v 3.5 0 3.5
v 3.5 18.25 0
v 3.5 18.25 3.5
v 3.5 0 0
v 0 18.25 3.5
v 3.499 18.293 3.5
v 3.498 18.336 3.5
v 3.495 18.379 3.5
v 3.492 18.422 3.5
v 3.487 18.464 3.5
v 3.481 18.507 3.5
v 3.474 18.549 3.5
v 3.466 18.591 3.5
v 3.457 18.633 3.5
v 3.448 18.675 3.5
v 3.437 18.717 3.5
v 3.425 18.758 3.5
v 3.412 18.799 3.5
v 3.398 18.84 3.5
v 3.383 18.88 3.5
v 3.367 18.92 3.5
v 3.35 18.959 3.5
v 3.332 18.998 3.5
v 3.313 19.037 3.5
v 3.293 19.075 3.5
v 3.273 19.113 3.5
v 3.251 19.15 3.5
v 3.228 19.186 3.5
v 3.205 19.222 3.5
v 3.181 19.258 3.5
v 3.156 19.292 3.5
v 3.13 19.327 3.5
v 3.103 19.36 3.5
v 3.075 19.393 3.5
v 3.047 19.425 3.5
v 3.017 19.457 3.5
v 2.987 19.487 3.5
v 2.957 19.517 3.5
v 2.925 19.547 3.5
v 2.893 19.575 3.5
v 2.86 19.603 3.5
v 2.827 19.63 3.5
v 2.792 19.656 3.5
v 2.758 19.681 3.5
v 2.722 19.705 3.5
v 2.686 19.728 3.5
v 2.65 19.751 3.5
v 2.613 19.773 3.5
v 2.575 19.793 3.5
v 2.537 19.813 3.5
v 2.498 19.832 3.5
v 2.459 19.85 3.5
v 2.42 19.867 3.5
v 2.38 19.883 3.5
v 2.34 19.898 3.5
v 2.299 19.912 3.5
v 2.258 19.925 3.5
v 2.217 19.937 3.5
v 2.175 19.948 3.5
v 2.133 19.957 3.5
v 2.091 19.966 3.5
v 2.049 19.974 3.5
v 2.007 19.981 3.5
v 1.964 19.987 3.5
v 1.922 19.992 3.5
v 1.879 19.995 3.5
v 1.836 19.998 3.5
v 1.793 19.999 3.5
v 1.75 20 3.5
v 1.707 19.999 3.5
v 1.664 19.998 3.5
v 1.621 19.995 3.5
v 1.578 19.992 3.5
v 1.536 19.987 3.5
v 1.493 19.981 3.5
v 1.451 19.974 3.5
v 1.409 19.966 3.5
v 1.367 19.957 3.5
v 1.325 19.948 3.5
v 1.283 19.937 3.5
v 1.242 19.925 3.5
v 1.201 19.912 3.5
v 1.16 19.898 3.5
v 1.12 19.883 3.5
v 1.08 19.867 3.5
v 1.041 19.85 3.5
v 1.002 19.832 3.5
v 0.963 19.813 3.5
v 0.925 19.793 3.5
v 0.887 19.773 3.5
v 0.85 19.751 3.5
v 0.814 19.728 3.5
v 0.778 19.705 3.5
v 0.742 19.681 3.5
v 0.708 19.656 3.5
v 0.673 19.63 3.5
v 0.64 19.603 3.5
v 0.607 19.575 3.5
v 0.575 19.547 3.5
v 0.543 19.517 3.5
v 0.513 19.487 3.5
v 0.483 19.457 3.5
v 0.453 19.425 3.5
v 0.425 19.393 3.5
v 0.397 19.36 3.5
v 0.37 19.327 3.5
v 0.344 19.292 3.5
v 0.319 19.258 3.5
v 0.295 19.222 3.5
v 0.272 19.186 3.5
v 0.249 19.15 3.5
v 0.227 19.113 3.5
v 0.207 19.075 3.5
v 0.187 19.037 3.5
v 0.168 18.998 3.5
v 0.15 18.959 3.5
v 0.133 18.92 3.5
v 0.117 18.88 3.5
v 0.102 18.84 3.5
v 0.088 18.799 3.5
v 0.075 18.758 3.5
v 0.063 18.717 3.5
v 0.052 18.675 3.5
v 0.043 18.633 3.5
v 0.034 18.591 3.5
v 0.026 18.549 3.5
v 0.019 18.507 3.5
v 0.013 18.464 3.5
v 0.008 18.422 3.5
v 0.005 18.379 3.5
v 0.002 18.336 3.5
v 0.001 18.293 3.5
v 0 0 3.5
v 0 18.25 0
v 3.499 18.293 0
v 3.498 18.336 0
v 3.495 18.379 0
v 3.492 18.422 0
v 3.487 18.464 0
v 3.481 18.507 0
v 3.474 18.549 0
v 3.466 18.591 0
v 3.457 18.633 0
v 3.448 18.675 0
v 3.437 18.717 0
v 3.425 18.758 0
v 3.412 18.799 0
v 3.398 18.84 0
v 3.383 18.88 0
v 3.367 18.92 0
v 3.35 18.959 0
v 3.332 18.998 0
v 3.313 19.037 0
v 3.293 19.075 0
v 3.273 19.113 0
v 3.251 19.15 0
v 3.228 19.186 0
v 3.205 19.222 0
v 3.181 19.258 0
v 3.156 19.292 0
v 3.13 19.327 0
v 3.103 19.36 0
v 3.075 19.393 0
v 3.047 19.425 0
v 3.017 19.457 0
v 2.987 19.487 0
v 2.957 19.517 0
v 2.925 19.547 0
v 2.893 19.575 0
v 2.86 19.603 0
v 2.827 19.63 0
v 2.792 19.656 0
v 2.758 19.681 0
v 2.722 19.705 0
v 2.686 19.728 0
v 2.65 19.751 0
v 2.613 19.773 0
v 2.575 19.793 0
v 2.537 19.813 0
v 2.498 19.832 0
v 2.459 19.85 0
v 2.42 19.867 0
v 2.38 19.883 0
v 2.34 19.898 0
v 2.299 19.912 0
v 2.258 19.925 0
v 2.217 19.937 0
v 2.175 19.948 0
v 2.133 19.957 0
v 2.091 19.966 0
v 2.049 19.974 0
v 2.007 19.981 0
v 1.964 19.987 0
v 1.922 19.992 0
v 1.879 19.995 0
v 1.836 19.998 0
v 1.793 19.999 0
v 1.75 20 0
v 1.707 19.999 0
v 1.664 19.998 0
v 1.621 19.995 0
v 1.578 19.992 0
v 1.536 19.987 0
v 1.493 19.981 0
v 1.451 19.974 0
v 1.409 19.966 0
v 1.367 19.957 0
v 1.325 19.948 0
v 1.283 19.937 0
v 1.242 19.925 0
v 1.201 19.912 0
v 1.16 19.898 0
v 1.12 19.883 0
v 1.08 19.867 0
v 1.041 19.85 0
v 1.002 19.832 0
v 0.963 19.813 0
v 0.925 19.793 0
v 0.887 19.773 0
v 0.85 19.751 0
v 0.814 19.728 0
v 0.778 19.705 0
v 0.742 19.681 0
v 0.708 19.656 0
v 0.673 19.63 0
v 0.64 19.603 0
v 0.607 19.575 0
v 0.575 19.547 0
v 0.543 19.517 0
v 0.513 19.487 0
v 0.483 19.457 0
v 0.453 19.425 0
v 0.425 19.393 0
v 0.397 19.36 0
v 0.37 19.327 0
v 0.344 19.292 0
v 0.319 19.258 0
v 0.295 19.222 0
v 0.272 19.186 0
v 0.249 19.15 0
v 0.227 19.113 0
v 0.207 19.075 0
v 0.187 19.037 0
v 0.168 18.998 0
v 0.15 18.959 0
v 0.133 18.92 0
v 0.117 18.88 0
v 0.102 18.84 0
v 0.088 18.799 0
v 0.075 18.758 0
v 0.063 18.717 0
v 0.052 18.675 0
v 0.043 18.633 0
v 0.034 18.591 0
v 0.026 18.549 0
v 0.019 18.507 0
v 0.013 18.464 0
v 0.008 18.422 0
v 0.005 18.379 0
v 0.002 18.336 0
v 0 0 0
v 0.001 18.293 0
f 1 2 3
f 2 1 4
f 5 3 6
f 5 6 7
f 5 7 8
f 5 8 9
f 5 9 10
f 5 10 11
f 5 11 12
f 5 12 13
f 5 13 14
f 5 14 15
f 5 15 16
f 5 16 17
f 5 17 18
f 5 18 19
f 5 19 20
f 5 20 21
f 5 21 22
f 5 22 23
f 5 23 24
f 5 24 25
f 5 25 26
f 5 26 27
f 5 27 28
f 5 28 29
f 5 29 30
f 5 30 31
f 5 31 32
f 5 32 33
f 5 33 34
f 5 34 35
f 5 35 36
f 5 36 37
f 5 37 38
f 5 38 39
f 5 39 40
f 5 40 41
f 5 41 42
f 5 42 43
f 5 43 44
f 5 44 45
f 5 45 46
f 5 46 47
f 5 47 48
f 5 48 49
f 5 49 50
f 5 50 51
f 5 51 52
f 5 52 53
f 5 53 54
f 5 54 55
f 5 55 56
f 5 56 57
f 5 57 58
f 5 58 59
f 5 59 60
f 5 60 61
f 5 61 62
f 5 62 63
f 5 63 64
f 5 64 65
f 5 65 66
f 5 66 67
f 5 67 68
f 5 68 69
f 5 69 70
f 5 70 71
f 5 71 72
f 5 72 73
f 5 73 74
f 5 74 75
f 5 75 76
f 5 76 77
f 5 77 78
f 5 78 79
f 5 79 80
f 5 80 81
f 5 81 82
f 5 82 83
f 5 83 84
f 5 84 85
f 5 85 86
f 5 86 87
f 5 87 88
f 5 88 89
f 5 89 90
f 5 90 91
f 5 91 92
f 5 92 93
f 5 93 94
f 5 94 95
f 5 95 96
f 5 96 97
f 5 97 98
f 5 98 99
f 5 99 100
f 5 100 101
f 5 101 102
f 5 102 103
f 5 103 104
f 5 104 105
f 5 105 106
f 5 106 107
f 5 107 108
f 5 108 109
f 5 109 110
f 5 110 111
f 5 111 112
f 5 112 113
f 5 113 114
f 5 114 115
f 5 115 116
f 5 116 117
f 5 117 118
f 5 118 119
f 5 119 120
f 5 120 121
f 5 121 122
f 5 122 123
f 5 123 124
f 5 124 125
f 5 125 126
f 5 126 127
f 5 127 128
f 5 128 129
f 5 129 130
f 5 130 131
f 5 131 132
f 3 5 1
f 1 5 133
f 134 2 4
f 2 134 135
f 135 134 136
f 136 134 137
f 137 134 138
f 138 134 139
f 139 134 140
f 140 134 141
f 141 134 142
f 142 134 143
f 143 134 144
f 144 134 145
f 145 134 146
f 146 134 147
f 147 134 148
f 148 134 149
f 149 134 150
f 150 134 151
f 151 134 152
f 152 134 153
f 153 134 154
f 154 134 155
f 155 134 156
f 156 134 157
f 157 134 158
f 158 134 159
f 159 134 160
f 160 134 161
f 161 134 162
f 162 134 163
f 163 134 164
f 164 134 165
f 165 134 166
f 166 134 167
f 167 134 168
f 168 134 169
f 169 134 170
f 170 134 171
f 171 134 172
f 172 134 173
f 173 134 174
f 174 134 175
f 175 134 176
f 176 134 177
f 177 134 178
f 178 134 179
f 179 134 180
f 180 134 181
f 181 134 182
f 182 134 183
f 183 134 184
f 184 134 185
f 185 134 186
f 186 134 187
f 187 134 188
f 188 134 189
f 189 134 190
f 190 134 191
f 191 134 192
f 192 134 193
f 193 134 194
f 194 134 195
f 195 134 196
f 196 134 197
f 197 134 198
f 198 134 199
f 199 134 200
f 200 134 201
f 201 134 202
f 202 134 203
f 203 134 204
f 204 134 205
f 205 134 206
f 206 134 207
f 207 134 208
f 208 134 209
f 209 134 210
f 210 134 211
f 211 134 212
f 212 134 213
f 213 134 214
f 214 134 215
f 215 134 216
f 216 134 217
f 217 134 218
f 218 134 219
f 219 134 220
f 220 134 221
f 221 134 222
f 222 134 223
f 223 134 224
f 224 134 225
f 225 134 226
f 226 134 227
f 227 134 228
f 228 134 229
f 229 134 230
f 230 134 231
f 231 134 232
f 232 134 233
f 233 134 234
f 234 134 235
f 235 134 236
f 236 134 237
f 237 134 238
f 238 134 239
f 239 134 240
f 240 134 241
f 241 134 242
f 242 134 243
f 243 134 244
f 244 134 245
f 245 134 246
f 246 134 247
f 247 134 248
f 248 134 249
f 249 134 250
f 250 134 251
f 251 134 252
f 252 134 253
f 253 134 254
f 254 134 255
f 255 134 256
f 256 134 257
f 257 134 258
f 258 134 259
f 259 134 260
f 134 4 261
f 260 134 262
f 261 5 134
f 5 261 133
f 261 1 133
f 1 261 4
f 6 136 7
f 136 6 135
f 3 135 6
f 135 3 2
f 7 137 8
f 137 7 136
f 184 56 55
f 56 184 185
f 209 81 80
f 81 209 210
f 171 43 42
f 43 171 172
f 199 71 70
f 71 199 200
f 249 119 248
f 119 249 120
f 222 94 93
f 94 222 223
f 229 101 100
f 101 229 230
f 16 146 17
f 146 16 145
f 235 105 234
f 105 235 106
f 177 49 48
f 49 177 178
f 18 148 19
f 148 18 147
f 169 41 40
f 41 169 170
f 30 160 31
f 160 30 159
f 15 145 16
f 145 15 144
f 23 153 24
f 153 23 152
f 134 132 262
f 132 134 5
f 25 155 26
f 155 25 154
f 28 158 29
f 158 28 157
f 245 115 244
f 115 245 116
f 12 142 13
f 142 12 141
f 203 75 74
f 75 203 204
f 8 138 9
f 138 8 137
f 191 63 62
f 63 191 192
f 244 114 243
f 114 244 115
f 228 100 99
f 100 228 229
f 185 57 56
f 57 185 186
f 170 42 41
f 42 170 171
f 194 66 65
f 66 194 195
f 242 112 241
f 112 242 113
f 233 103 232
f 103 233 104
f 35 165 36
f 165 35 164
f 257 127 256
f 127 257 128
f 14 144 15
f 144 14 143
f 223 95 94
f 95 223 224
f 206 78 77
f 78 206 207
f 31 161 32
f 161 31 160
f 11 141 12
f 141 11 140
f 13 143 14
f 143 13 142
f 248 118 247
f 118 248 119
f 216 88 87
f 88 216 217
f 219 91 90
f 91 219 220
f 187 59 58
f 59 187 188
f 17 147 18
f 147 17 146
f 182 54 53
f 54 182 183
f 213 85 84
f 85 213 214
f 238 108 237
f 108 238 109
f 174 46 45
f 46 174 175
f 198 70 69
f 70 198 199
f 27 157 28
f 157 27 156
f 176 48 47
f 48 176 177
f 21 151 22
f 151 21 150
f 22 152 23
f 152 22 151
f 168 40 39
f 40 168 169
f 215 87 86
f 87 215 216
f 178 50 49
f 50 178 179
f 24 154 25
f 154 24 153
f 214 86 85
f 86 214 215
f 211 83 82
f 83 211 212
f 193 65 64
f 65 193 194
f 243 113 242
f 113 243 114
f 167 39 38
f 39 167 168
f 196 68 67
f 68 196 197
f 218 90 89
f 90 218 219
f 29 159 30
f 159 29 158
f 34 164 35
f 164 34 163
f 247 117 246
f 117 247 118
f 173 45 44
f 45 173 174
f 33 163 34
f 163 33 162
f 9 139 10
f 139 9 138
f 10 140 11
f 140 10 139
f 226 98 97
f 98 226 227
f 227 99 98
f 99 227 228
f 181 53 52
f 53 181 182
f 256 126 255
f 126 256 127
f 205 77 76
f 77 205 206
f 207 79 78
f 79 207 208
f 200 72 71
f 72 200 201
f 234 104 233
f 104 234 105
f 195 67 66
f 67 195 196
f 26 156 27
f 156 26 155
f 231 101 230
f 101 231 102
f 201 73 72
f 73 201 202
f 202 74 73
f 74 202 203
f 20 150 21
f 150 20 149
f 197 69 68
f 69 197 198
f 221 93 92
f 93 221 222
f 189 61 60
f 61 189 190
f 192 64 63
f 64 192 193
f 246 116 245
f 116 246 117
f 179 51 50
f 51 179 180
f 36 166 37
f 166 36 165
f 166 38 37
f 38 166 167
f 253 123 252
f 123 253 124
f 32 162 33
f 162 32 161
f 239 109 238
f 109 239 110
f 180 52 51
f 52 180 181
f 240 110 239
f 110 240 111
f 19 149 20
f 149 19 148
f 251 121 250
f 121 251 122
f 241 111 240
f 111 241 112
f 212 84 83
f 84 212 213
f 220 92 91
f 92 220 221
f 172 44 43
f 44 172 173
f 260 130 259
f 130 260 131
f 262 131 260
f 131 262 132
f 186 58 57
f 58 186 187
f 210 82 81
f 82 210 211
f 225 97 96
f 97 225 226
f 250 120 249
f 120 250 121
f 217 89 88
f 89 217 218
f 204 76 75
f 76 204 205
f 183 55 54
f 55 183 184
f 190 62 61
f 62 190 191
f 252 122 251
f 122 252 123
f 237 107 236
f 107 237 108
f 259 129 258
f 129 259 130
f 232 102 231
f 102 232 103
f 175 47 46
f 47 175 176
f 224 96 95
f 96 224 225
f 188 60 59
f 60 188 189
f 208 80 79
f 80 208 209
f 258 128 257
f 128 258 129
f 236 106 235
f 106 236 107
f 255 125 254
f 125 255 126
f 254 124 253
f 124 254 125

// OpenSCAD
// Patrick Star Shear Pin Generator - by Mean-UI-Thread
// This file is part of https://github.com/mean-ui-thread/3dprinting.git repo
// Licensed under the MIT License (see LICENSE file in the repo root)


/* [Shear Pin Size Configuration] */

// Base width (mm)
base_width = 3.5; // [0:0.1:32] 

// Base height (mm)
base_height = 3.5; // [0:0.1:32] 

// Base Length (mm)
base_length = 20.0; // [0:0.1:64]


// Adjust curve resolution
$fn = 256;                   // [8:8:512]


// === MODULES ===
module shear_pin() {

    half_base_width = base_width * 0.5;

    cylinder_diameter = base_width;
    cylinder_height = base_height;

    cylinder_x = base_height * 0.5;
    cylinder_y = base_length - half_base_width;
    cylinder_z = 0;



    difference() {
        union() {
            translate([0, 0, 0])
              cube([
                    base_width,
                    cylinder_y,
                    base_height
                ], center = false);
            translate([cylinder_x, cylinder_y, cylinder_z])
            cylinder(
                h = cylinder_height,
                d = cylinder_diameter,
                center = false
            );
        }
    }
}

shear_pin();
